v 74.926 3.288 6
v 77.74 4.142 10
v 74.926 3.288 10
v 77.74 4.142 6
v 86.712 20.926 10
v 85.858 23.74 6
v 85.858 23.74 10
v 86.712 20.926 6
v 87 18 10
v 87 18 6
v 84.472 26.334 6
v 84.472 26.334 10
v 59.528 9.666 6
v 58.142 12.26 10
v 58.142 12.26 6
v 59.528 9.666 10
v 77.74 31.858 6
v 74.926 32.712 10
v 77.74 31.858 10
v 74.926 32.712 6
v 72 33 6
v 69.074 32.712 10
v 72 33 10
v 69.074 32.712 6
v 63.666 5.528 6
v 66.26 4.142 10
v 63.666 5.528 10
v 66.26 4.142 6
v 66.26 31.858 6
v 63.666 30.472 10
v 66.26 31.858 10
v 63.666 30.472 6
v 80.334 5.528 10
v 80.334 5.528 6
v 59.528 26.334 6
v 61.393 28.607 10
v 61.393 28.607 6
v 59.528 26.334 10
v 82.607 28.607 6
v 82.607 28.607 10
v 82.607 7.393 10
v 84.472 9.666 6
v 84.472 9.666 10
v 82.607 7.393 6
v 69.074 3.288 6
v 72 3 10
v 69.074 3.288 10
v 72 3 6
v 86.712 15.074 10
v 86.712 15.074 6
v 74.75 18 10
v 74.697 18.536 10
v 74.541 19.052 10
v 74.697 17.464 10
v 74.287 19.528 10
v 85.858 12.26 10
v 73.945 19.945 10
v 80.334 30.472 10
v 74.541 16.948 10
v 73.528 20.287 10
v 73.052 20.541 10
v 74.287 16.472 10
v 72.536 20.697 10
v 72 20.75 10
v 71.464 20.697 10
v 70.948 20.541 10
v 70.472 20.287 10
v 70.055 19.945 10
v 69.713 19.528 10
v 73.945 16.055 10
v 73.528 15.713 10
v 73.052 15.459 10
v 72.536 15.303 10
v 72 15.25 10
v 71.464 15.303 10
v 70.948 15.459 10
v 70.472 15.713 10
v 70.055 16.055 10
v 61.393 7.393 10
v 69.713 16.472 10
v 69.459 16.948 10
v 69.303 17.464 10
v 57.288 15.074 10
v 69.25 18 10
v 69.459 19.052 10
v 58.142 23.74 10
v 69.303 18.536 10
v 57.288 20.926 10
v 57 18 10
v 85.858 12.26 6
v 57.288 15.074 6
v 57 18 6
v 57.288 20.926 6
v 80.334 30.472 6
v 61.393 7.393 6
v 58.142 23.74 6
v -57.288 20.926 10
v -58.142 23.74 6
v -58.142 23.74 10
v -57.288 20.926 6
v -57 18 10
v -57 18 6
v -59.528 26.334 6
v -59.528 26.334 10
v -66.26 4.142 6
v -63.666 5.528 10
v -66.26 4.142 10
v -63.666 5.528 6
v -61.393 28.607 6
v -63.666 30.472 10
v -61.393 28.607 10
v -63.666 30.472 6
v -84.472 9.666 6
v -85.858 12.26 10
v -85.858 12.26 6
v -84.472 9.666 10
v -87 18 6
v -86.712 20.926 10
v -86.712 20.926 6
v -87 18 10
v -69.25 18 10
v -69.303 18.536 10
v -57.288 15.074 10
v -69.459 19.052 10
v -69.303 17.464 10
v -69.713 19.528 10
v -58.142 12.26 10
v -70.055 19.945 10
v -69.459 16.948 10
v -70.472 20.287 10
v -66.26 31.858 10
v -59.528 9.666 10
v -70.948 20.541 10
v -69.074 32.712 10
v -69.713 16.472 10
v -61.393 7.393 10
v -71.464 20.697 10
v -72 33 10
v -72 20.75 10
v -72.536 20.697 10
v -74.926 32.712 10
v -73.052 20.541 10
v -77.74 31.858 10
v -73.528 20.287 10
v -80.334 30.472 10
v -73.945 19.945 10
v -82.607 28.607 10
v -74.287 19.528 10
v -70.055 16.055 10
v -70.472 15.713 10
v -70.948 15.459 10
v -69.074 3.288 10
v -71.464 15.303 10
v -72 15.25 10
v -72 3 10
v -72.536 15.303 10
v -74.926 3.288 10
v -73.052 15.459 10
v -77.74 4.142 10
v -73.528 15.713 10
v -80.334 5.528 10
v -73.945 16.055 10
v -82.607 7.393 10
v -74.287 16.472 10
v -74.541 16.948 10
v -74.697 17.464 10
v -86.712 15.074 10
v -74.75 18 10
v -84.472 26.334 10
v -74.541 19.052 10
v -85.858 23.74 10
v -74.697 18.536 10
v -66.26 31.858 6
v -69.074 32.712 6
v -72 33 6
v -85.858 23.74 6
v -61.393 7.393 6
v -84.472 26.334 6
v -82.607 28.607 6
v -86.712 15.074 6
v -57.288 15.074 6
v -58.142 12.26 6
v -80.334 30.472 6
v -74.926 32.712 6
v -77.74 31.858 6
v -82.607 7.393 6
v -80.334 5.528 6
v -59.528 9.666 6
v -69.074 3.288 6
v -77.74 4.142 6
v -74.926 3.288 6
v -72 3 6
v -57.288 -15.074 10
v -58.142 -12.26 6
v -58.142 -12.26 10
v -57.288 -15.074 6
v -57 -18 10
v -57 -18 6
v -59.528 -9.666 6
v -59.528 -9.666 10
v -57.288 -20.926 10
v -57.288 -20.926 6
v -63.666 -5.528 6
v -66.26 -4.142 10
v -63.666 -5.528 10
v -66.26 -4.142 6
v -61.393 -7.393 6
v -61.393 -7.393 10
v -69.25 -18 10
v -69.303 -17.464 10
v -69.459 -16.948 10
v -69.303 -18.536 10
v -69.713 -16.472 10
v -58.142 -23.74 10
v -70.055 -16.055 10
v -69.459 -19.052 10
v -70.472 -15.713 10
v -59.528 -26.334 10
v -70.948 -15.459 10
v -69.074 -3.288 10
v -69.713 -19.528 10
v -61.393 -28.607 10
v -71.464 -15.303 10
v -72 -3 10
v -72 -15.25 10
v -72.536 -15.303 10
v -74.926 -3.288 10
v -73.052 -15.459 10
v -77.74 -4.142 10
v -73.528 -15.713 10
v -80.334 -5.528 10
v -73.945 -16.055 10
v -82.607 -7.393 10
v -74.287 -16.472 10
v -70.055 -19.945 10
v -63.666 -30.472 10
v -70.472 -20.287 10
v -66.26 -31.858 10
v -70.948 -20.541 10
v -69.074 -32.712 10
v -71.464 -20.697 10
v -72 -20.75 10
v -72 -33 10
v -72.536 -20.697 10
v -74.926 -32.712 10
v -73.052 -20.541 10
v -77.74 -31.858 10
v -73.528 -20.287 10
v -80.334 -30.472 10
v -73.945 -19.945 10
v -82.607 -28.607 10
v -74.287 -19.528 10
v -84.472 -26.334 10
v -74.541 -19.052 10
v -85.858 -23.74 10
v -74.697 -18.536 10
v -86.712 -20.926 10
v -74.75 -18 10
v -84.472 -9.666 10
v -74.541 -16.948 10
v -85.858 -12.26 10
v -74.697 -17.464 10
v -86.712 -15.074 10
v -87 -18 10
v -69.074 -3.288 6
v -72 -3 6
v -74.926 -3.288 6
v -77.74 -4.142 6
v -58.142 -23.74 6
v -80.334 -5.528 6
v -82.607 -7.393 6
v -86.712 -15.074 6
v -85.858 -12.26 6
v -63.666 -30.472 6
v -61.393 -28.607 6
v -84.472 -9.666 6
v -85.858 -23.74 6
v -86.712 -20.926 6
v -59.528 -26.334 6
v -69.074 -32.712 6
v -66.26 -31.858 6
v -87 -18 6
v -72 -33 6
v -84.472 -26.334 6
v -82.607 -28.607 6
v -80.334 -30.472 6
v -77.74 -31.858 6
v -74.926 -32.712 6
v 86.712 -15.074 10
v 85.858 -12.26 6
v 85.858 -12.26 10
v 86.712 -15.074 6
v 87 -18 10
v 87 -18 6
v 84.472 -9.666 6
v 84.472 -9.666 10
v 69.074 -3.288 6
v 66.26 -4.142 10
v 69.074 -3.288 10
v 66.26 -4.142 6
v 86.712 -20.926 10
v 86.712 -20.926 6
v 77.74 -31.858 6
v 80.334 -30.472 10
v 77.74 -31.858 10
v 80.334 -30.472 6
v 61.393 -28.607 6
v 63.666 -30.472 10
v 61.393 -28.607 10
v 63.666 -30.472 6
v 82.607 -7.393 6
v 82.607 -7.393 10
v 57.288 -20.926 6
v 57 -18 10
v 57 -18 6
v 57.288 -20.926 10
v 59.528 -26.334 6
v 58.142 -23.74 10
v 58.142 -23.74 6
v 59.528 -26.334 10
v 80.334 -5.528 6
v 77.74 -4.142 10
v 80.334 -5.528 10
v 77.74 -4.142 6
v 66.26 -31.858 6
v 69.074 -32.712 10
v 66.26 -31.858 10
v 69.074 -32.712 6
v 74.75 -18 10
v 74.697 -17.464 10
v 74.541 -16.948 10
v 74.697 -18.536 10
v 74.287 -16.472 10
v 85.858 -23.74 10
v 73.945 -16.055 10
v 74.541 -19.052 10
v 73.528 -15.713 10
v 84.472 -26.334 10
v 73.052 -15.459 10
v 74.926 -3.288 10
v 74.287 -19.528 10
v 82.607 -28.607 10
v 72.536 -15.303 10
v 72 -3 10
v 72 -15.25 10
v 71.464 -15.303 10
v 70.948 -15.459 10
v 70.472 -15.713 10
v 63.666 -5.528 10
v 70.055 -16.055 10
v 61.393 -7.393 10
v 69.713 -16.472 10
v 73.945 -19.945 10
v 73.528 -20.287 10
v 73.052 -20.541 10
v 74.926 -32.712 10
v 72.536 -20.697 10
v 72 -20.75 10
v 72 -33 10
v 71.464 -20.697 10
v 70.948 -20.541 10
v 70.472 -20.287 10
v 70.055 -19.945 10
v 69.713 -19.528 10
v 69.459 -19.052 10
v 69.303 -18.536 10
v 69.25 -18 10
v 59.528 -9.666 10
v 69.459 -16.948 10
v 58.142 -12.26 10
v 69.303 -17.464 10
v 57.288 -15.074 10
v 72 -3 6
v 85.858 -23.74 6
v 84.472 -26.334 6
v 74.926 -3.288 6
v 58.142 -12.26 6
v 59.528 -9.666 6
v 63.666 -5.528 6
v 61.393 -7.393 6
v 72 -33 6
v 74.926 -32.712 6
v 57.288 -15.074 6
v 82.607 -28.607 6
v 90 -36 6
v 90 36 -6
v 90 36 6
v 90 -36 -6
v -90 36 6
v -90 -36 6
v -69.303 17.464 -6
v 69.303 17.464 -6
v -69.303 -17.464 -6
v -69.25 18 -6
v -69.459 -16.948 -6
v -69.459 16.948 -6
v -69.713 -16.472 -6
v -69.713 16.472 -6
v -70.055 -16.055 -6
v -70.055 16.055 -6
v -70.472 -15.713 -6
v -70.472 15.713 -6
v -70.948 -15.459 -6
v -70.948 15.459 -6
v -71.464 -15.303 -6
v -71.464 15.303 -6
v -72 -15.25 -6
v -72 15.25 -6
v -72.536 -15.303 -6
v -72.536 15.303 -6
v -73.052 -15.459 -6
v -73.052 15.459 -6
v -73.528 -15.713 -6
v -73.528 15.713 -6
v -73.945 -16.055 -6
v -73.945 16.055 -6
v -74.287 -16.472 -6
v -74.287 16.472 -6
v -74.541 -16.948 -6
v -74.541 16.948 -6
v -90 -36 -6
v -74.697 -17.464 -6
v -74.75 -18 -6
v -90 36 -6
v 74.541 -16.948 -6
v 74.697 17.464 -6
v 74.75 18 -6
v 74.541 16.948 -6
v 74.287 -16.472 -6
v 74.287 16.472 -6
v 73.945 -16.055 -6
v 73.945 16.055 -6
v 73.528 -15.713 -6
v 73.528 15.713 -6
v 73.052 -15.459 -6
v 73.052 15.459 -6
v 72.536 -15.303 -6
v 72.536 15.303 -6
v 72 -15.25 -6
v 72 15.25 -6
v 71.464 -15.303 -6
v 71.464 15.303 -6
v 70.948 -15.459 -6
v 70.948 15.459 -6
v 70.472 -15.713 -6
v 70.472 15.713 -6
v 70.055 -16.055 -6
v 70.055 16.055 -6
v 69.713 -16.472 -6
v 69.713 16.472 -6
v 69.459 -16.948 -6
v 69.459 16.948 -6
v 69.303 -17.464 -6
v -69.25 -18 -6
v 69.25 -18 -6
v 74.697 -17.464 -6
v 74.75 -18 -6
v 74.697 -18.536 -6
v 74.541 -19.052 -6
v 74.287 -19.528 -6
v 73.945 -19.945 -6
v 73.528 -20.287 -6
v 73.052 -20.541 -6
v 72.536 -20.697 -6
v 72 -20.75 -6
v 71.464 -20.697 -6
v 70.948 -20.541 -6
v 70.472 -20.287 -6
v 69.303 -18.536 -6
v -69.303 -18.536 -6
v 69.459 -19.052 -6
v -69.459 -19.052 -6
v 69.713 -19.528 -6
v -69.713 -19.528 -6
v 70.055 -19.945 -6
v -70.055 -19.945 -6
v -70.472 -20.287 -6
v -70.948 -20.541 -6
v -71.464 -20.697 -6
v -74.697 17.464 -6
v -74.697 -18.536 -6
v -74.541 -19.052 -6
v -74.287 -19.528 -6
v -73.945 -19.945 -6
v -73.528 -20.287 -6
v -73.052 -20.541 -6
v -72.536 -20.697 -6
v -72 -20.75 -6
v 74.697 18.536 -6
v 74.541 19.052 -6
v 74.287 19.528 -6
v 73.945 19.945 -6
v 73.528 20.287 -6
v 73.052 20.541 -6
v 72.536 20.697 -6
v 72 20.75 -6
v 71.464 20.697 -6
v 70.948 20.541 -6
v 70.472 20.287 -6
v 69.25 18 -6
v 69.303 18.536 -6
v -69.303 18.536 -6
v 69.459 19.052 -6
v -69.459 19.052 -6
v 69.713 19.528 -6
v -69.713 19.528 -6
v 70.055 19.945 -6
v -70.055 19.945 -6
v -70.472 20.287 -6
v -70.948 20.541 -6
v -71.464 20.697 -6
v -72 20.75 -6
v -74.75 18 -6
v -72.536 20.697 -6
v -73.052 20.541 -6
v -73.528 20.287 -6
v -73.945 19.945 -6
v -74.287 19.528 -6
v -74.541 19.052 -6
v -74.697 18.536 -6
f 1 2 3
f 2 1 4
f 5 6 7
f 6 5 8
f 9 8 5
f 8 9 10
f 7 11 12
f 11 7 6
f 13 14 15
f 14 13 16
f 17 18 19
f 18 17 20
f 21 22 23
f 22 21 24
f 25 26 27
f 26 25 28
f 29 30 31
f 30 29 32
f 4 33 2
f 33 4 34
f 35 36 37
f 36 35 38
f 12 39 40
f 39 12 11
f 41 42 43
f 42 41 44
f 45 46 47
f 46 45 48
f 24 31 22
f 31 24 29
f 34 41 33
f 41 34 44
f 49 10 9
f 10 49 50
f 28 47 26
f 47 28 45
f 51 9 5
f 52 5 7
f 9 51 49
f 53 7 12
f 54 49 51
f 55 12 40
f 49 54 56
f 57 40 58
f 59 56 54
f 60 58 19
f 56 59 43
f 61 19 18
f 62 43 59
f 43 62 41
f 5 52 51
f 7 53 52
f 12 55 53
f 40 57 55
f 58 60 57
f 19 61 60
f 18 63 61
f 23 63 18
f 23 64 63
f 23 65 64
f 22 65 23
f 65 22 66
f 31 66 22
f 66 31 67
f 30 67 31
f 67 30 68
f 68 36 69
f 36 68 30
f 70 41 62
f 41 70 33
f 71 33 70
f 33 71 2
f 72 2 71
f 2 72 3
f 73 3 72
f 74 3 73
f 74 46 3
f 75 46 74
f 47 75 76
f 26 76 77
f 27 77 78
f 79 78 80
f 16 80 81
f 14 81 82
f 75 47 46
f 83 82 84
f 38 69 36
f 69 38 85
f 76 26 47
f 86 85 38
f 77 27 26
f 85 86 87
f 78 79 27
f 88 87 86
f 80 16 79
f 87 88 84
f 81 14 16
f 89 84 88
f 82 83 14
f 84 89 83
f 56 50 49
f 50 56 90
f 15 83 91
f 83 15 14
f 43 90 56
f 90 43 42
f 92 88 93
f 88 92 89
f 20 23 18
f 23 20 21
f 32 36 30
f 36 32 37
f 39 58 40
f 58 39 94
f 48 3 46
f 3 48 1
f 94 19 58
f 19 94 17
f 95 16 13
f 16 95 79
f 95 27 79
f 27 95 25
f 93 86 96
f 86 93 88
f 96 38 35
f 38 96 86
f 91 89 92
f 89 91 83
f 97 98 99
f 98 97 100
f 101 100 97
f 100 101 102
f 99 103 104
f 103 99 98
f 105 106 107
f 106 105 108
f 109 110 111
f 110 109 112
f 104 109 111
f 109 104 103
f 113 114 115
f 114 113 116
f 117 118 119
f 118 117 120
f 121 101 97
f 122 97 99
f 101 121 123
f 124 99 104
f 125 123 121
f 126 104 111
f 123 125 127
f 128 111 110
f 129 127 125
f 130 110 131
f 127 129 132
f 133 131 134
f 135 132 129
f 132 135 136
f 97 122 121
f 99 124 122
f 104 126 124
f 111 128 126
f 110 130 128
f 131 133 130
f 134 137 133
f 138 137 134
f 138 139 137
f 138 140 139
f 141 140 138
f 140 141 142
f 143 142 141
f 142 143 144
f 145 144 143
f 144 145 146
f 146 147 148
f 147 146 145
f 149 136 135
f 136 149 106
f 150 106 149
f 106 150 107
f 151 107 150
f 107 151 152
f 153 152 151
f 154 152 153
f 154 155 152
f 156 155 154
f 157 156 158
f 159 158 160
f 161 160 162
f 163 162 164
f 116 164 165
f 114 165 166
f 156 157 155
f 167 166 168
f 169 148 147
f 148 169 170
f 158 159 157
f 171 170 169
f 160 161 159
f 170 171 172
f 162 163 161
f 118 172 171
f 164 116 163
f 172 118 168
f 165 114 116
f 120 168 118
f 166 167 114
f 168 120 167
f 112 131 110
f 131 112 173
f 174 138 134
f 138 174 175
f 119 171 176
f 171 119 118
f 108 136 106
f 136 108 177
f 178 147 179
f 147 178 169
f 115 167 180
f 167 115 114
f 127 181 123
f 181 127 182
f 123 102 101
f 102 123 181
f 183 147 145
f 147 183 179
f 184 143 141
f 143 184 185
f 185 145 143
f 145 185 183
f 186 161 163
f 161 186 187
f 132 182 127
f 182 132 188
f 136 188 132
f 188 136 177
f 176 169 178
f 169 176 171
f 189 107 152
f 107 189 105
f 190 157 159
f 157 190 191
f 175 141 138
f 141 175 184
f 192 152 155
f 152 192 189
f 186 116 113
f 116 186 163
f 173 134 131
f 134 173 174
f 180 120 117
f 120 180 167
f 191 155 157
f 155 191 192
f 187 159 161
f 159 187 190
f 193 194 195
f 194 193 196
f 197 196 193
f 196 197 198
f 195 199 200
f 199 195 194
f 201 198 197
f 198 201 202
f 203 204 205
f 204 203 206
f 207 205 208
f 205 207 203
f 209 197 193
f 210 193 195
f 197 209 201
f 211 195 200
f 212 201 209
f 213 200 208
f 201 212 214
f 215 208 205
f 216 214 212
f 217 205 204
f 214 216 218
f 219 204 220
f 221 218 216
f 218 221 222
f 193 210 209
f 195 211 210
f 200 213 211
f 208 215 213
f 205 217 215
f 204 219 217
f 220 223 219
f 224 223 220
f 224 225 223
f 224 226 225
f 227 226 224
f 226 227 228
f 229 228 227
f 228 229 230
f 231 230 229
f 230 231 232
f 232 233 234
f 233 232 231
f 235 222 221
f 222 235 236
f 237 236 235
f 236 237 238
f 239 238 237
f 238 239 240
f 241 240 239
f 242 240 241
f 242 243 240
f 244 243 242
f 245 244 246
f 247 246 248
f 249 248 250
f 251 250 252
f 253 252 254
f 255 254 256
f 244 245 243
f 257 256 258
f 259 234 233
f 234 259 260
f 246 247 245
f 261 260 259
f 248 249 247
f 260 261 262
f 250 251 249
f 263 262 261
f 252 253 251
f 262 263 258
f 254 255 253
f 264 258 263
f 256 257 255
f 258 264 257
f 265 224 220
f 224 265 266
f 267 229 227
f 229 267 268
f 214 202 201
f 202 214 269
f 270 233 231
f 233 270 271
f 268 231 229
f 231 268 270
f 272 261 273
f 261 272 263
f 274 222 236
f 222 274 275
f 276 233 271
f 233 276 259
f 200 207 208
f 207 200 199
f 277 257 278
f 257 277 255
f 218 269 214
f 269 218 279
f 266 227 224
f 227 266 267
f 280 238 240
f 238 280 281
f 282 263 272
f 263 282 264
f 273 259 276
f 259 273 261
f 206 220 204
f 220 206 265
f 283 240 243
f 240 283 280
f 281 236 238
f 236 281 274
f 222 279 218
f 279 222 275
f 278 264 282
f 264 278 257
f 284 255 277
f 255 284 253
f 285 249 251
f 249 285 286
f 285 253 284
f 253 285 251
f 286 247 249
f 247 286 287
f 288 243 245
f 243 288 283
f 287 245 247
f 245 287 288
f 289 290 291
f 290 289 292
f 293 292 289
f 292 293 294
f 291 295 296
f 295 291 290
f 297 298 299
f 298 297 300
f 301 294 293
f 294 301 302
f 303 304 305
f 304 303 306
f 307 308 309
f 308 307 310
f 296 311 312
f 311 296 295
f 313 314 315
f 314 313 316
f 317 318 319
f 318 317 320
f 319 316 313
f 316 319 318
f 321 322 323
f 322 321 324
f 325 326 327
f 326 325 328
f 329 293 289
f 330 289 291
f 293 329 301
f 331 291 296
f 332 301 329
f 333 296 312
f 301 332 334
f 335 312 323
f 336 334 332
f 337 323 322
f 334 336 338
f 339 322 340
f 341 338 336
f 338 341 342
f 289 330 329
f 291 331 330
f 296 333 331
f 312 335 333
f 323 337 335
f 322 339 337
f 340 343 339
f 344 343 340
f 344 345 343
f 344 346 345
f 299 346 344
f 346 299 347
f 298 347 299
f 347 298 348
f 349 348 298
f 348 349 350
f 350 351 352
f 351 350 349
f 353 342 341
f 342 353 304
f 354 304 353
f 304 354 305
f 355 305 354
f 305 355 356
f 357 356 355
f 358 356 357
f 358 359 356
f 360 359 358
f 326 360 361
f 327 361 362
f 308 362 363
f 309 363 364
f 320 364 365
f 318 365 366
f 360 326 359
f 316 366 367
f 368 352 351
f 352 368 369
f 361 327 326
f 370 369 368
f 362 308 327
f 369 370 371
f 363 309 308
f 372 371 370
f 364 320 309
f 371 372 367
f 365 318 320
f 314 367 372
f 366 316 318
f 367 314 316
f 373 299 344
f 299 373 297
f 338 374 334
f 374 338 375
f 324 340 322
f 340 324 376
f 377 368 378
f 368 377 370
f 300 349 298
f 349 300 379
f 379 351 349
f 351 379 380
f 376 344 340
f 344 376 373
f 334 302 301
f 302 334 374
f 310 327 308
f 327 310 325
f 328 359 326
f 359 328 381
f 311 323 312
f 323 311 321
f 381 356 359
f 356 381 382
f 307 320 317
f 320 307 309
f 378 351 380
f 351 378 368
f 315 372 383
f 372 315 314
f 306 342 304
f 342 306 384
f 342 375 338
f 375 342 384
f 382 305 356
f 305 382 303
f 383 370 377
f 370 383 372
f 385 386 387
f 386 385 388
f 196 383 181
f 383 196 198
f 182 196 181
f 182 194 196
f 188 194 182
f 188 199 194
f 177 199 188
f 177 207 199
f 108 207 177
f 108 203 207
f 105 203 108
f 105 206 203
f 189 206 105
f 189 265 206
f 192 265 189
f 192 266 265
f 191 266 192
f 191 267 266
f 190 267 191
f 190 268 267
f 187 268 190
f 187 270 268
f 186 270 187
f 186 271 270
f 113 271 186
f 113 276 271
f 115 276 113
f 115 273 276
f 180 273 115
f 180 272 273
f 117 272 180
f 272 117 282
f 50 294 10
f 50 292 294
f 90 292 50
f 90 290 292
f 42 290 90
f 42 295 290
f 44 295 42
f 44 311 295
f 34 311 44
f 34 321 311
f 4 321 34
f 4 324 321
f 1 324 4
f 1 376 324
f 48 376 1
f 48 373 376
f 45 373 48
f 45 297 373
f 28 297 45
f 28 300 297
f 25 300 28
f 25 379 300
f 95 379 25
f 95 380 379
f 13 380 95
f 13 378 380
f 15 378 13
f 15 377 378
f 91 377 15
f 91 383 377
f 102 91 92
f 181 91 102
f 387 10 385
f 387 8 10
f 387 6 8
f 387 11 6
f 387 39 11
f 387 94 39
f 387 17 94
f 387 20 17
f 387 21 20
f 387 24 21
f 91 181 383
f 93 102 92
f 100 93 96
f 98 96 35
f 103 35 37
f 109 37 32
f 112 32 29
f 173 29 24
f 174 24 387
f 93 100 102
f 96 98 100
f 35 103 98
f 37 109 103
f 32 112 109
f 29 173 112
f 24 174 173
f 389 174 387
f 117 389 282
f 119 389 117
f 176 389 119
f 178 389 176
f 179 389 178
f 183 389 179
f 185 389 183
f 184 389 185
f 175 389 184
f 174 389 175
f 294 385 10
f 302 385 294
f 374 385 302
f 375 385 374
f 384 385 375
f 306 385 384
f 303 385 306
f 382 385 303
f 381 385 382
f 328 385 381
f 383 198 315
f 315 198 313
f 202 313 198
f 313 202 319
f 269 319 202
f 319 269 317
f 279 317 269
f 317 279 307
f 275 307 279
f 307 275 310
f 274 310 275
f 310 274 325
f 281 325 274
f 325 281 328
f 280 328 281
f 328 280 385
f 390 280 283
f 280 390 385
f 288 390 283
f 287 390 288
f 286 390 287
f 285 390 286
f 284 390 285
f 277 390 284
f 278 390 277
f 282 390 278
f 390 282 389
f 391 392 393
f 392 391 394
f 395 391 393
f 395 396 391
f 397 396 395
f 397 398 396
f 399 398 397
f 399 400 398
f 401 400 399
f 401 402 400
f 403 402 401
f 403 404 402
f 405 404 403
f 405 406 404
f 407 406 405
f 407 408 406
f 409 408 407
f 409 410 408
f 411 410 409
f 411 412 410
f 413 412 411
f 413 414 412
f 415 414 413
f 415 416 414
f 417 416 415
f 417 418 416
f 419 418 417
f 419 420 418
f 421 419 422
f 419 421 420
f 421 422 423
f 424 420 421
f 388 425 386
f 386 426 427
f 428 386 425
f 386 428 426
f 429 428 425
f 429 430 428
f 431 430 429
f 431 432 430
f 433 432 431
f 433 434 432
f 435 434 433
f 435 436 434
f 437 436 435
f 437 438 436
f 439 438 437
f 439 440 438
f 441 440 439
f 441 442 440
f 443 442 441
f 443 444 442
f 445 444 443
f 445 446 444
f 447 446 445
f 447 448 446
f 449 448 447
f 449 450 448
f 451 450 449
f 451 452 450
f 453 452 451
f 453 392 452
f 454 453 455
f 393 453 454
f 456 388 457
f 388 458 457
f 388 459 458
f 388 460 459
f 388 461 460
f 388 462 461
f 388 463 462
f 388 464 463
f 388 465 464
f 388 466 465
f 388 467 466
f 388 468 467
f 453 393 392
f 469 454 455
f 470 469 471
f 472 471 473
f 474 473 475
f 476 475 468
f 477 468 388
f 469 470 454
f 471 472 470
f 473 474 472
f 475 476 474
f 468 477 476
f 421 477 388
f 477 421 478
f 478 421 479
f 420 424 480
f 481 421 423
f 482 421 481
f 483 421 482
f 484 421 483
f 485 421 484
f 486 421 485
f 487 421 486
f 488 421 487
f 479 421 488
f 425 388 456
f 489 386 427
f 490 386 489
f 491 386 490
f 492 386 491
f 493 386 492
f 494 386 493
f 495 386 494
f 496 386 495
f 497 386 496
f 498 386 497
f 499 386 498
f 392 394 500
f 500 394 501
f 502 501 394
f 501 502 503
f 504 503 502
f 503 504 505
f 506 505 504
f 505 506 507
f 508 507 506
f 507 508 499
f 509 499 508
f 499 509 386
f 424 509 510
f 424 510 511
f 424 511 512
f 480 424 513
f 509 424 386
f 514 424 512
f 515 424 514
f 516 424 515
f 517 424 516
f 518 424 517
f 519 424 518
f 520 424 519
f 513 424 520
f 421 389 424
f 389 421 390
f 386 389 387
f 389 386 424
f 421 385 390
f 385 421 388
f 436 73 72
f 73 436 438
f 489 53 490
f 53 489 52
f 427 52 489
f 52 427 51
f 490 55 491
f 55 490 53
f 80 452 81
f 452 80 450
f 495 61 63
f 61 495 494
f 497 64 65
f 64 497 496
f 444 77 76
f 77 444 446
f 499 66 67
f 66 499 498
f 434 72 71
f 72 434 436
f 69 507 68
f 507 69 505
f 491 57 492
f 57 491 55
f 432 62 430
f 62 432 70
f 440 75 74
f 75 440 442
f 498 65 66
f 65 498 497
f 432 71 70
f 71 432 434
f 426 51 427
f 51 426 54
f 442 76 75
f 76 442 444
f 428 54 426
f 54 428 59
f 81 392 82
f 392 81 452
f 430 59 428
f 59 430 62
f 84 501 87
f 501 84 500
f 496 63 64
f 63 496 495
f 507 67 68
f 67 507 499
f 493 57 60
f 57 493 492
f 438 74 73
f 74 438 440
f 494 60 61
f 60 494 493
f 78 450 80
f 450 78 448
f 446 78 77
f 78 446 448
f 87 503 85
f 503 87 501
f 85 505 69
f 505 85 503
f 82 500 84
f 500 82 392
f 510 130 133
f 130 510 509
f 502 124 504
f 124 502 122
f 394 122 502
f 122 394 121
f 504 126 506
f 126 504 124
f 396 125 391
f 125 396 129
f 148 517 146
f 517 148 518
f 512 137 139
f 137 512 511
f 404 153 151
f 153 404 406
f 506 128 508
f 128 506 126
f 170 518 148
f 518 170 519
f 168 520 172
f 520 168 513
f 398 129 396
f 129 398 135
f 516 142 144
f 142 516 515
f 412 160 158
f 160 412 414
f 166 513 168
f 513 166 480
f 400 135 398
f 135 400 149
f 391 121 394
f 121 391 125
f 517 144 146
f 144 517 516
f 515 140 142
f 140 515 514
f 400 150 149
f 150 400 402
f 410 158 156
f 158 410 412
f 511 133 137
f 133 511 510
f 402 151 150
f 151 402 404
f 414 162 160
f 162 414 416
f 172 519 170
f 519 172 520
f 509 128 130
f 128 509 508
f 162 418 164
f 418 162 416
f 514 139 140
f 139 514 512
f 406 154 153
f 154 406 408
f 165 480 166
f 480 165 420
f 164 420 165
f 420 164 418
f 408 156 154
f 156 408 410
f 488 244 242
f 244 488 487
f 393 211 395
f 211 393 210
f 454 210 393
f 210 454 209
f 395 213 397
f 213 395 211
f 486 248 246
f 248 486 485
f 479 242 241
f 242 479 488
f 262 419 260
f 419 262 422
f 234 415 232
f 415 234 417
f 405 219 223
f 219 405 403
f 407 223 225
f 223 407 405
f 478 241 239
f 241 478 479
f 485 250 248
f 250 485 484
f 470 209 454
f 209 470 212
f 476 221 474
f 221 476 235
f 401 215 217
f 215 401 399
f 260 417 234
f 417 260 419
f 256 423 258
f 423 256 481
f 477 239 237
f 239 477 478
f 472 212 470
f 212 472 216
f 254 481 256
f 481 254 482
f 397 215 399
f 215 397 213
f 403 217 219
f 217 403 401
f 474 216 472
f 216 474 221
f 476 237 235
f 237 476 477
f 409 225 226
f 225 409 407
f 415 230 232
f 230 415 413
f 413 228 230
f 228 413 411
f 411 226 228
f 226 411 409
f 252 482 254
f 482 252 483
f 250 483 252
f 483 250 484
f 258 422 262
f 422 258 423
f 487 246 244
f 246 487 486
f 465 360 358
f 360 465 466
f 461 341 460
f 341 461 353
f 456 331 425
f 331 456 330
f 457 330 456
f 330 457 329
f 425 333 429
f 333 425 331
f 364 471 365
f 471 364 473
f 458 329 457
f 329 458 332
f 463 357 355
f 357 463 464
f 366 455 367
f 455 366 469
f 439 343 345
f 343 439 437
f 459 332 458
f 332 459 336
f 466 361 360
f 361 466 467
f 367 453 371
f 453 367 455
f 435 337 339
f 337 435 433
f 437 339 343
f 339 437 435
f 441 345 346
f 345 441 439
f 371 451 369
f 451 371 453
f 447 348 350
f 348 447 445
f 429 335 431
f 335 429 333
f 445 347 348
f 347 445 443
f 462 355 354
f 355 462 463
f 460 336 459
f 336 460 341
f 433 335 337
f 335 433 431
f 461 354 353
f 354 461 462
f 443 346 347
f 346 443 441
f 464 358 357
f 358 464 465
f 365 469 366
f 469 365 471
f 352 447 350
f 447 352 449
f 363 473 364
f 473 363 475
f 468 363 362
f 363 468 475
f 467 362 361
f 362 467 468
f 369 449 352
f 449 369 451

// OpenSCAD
$fn = 32;

// ----------------------------------------------------------------------
// Anchor pads 180 x 72 x 16
// four corner bosses with anchor holes
// ----------------------------------------------------------------------

// --- parameters (mm) ---
plate = [180, 72, 12];  // base plate size (x, y, z)
pads = 4;               // boss count, one per corner
edge = 18;              // boss centre offset from the plate edge
boss_d = 30;            // boss diameter
boss_h = 4;             // boss height above the base plate
hole_d = 5.5;           // hole diameter

// --- derived feature positions (mm) ---
height = plate[2] + boss_h;      // = 16   overall height of the part
corner_x = plate[0] / 2 - edge;  // = 72   boss centre X
corner_y = plate[1] / 2 - edge;  // = 18   boss centre Y
feature_centers = [
  [corner_x, corner_y],
  [-corner_x, corner_y],
  [-corner_x, -corner_y],
  [corner_x, -corner_y]
];   // boss centres, anchor holes are drilled there

// base plate, four bosses standing on it, anchor holes all the way through
difference() {
  union() {
    cube(plate, center = true);
    for (centre = feature_centers)
      translate([centre[0], centre[1], plate[2] / 2 - 1])
        cylinder(d = boss_d, h = boss_h + 1);
  }
  for (centre = feature_centers)
    translate([centre[0], centre[1], -height])
      cylinder(d = hole_d, h = 2 * height + 2);  // through boss and plate
}
